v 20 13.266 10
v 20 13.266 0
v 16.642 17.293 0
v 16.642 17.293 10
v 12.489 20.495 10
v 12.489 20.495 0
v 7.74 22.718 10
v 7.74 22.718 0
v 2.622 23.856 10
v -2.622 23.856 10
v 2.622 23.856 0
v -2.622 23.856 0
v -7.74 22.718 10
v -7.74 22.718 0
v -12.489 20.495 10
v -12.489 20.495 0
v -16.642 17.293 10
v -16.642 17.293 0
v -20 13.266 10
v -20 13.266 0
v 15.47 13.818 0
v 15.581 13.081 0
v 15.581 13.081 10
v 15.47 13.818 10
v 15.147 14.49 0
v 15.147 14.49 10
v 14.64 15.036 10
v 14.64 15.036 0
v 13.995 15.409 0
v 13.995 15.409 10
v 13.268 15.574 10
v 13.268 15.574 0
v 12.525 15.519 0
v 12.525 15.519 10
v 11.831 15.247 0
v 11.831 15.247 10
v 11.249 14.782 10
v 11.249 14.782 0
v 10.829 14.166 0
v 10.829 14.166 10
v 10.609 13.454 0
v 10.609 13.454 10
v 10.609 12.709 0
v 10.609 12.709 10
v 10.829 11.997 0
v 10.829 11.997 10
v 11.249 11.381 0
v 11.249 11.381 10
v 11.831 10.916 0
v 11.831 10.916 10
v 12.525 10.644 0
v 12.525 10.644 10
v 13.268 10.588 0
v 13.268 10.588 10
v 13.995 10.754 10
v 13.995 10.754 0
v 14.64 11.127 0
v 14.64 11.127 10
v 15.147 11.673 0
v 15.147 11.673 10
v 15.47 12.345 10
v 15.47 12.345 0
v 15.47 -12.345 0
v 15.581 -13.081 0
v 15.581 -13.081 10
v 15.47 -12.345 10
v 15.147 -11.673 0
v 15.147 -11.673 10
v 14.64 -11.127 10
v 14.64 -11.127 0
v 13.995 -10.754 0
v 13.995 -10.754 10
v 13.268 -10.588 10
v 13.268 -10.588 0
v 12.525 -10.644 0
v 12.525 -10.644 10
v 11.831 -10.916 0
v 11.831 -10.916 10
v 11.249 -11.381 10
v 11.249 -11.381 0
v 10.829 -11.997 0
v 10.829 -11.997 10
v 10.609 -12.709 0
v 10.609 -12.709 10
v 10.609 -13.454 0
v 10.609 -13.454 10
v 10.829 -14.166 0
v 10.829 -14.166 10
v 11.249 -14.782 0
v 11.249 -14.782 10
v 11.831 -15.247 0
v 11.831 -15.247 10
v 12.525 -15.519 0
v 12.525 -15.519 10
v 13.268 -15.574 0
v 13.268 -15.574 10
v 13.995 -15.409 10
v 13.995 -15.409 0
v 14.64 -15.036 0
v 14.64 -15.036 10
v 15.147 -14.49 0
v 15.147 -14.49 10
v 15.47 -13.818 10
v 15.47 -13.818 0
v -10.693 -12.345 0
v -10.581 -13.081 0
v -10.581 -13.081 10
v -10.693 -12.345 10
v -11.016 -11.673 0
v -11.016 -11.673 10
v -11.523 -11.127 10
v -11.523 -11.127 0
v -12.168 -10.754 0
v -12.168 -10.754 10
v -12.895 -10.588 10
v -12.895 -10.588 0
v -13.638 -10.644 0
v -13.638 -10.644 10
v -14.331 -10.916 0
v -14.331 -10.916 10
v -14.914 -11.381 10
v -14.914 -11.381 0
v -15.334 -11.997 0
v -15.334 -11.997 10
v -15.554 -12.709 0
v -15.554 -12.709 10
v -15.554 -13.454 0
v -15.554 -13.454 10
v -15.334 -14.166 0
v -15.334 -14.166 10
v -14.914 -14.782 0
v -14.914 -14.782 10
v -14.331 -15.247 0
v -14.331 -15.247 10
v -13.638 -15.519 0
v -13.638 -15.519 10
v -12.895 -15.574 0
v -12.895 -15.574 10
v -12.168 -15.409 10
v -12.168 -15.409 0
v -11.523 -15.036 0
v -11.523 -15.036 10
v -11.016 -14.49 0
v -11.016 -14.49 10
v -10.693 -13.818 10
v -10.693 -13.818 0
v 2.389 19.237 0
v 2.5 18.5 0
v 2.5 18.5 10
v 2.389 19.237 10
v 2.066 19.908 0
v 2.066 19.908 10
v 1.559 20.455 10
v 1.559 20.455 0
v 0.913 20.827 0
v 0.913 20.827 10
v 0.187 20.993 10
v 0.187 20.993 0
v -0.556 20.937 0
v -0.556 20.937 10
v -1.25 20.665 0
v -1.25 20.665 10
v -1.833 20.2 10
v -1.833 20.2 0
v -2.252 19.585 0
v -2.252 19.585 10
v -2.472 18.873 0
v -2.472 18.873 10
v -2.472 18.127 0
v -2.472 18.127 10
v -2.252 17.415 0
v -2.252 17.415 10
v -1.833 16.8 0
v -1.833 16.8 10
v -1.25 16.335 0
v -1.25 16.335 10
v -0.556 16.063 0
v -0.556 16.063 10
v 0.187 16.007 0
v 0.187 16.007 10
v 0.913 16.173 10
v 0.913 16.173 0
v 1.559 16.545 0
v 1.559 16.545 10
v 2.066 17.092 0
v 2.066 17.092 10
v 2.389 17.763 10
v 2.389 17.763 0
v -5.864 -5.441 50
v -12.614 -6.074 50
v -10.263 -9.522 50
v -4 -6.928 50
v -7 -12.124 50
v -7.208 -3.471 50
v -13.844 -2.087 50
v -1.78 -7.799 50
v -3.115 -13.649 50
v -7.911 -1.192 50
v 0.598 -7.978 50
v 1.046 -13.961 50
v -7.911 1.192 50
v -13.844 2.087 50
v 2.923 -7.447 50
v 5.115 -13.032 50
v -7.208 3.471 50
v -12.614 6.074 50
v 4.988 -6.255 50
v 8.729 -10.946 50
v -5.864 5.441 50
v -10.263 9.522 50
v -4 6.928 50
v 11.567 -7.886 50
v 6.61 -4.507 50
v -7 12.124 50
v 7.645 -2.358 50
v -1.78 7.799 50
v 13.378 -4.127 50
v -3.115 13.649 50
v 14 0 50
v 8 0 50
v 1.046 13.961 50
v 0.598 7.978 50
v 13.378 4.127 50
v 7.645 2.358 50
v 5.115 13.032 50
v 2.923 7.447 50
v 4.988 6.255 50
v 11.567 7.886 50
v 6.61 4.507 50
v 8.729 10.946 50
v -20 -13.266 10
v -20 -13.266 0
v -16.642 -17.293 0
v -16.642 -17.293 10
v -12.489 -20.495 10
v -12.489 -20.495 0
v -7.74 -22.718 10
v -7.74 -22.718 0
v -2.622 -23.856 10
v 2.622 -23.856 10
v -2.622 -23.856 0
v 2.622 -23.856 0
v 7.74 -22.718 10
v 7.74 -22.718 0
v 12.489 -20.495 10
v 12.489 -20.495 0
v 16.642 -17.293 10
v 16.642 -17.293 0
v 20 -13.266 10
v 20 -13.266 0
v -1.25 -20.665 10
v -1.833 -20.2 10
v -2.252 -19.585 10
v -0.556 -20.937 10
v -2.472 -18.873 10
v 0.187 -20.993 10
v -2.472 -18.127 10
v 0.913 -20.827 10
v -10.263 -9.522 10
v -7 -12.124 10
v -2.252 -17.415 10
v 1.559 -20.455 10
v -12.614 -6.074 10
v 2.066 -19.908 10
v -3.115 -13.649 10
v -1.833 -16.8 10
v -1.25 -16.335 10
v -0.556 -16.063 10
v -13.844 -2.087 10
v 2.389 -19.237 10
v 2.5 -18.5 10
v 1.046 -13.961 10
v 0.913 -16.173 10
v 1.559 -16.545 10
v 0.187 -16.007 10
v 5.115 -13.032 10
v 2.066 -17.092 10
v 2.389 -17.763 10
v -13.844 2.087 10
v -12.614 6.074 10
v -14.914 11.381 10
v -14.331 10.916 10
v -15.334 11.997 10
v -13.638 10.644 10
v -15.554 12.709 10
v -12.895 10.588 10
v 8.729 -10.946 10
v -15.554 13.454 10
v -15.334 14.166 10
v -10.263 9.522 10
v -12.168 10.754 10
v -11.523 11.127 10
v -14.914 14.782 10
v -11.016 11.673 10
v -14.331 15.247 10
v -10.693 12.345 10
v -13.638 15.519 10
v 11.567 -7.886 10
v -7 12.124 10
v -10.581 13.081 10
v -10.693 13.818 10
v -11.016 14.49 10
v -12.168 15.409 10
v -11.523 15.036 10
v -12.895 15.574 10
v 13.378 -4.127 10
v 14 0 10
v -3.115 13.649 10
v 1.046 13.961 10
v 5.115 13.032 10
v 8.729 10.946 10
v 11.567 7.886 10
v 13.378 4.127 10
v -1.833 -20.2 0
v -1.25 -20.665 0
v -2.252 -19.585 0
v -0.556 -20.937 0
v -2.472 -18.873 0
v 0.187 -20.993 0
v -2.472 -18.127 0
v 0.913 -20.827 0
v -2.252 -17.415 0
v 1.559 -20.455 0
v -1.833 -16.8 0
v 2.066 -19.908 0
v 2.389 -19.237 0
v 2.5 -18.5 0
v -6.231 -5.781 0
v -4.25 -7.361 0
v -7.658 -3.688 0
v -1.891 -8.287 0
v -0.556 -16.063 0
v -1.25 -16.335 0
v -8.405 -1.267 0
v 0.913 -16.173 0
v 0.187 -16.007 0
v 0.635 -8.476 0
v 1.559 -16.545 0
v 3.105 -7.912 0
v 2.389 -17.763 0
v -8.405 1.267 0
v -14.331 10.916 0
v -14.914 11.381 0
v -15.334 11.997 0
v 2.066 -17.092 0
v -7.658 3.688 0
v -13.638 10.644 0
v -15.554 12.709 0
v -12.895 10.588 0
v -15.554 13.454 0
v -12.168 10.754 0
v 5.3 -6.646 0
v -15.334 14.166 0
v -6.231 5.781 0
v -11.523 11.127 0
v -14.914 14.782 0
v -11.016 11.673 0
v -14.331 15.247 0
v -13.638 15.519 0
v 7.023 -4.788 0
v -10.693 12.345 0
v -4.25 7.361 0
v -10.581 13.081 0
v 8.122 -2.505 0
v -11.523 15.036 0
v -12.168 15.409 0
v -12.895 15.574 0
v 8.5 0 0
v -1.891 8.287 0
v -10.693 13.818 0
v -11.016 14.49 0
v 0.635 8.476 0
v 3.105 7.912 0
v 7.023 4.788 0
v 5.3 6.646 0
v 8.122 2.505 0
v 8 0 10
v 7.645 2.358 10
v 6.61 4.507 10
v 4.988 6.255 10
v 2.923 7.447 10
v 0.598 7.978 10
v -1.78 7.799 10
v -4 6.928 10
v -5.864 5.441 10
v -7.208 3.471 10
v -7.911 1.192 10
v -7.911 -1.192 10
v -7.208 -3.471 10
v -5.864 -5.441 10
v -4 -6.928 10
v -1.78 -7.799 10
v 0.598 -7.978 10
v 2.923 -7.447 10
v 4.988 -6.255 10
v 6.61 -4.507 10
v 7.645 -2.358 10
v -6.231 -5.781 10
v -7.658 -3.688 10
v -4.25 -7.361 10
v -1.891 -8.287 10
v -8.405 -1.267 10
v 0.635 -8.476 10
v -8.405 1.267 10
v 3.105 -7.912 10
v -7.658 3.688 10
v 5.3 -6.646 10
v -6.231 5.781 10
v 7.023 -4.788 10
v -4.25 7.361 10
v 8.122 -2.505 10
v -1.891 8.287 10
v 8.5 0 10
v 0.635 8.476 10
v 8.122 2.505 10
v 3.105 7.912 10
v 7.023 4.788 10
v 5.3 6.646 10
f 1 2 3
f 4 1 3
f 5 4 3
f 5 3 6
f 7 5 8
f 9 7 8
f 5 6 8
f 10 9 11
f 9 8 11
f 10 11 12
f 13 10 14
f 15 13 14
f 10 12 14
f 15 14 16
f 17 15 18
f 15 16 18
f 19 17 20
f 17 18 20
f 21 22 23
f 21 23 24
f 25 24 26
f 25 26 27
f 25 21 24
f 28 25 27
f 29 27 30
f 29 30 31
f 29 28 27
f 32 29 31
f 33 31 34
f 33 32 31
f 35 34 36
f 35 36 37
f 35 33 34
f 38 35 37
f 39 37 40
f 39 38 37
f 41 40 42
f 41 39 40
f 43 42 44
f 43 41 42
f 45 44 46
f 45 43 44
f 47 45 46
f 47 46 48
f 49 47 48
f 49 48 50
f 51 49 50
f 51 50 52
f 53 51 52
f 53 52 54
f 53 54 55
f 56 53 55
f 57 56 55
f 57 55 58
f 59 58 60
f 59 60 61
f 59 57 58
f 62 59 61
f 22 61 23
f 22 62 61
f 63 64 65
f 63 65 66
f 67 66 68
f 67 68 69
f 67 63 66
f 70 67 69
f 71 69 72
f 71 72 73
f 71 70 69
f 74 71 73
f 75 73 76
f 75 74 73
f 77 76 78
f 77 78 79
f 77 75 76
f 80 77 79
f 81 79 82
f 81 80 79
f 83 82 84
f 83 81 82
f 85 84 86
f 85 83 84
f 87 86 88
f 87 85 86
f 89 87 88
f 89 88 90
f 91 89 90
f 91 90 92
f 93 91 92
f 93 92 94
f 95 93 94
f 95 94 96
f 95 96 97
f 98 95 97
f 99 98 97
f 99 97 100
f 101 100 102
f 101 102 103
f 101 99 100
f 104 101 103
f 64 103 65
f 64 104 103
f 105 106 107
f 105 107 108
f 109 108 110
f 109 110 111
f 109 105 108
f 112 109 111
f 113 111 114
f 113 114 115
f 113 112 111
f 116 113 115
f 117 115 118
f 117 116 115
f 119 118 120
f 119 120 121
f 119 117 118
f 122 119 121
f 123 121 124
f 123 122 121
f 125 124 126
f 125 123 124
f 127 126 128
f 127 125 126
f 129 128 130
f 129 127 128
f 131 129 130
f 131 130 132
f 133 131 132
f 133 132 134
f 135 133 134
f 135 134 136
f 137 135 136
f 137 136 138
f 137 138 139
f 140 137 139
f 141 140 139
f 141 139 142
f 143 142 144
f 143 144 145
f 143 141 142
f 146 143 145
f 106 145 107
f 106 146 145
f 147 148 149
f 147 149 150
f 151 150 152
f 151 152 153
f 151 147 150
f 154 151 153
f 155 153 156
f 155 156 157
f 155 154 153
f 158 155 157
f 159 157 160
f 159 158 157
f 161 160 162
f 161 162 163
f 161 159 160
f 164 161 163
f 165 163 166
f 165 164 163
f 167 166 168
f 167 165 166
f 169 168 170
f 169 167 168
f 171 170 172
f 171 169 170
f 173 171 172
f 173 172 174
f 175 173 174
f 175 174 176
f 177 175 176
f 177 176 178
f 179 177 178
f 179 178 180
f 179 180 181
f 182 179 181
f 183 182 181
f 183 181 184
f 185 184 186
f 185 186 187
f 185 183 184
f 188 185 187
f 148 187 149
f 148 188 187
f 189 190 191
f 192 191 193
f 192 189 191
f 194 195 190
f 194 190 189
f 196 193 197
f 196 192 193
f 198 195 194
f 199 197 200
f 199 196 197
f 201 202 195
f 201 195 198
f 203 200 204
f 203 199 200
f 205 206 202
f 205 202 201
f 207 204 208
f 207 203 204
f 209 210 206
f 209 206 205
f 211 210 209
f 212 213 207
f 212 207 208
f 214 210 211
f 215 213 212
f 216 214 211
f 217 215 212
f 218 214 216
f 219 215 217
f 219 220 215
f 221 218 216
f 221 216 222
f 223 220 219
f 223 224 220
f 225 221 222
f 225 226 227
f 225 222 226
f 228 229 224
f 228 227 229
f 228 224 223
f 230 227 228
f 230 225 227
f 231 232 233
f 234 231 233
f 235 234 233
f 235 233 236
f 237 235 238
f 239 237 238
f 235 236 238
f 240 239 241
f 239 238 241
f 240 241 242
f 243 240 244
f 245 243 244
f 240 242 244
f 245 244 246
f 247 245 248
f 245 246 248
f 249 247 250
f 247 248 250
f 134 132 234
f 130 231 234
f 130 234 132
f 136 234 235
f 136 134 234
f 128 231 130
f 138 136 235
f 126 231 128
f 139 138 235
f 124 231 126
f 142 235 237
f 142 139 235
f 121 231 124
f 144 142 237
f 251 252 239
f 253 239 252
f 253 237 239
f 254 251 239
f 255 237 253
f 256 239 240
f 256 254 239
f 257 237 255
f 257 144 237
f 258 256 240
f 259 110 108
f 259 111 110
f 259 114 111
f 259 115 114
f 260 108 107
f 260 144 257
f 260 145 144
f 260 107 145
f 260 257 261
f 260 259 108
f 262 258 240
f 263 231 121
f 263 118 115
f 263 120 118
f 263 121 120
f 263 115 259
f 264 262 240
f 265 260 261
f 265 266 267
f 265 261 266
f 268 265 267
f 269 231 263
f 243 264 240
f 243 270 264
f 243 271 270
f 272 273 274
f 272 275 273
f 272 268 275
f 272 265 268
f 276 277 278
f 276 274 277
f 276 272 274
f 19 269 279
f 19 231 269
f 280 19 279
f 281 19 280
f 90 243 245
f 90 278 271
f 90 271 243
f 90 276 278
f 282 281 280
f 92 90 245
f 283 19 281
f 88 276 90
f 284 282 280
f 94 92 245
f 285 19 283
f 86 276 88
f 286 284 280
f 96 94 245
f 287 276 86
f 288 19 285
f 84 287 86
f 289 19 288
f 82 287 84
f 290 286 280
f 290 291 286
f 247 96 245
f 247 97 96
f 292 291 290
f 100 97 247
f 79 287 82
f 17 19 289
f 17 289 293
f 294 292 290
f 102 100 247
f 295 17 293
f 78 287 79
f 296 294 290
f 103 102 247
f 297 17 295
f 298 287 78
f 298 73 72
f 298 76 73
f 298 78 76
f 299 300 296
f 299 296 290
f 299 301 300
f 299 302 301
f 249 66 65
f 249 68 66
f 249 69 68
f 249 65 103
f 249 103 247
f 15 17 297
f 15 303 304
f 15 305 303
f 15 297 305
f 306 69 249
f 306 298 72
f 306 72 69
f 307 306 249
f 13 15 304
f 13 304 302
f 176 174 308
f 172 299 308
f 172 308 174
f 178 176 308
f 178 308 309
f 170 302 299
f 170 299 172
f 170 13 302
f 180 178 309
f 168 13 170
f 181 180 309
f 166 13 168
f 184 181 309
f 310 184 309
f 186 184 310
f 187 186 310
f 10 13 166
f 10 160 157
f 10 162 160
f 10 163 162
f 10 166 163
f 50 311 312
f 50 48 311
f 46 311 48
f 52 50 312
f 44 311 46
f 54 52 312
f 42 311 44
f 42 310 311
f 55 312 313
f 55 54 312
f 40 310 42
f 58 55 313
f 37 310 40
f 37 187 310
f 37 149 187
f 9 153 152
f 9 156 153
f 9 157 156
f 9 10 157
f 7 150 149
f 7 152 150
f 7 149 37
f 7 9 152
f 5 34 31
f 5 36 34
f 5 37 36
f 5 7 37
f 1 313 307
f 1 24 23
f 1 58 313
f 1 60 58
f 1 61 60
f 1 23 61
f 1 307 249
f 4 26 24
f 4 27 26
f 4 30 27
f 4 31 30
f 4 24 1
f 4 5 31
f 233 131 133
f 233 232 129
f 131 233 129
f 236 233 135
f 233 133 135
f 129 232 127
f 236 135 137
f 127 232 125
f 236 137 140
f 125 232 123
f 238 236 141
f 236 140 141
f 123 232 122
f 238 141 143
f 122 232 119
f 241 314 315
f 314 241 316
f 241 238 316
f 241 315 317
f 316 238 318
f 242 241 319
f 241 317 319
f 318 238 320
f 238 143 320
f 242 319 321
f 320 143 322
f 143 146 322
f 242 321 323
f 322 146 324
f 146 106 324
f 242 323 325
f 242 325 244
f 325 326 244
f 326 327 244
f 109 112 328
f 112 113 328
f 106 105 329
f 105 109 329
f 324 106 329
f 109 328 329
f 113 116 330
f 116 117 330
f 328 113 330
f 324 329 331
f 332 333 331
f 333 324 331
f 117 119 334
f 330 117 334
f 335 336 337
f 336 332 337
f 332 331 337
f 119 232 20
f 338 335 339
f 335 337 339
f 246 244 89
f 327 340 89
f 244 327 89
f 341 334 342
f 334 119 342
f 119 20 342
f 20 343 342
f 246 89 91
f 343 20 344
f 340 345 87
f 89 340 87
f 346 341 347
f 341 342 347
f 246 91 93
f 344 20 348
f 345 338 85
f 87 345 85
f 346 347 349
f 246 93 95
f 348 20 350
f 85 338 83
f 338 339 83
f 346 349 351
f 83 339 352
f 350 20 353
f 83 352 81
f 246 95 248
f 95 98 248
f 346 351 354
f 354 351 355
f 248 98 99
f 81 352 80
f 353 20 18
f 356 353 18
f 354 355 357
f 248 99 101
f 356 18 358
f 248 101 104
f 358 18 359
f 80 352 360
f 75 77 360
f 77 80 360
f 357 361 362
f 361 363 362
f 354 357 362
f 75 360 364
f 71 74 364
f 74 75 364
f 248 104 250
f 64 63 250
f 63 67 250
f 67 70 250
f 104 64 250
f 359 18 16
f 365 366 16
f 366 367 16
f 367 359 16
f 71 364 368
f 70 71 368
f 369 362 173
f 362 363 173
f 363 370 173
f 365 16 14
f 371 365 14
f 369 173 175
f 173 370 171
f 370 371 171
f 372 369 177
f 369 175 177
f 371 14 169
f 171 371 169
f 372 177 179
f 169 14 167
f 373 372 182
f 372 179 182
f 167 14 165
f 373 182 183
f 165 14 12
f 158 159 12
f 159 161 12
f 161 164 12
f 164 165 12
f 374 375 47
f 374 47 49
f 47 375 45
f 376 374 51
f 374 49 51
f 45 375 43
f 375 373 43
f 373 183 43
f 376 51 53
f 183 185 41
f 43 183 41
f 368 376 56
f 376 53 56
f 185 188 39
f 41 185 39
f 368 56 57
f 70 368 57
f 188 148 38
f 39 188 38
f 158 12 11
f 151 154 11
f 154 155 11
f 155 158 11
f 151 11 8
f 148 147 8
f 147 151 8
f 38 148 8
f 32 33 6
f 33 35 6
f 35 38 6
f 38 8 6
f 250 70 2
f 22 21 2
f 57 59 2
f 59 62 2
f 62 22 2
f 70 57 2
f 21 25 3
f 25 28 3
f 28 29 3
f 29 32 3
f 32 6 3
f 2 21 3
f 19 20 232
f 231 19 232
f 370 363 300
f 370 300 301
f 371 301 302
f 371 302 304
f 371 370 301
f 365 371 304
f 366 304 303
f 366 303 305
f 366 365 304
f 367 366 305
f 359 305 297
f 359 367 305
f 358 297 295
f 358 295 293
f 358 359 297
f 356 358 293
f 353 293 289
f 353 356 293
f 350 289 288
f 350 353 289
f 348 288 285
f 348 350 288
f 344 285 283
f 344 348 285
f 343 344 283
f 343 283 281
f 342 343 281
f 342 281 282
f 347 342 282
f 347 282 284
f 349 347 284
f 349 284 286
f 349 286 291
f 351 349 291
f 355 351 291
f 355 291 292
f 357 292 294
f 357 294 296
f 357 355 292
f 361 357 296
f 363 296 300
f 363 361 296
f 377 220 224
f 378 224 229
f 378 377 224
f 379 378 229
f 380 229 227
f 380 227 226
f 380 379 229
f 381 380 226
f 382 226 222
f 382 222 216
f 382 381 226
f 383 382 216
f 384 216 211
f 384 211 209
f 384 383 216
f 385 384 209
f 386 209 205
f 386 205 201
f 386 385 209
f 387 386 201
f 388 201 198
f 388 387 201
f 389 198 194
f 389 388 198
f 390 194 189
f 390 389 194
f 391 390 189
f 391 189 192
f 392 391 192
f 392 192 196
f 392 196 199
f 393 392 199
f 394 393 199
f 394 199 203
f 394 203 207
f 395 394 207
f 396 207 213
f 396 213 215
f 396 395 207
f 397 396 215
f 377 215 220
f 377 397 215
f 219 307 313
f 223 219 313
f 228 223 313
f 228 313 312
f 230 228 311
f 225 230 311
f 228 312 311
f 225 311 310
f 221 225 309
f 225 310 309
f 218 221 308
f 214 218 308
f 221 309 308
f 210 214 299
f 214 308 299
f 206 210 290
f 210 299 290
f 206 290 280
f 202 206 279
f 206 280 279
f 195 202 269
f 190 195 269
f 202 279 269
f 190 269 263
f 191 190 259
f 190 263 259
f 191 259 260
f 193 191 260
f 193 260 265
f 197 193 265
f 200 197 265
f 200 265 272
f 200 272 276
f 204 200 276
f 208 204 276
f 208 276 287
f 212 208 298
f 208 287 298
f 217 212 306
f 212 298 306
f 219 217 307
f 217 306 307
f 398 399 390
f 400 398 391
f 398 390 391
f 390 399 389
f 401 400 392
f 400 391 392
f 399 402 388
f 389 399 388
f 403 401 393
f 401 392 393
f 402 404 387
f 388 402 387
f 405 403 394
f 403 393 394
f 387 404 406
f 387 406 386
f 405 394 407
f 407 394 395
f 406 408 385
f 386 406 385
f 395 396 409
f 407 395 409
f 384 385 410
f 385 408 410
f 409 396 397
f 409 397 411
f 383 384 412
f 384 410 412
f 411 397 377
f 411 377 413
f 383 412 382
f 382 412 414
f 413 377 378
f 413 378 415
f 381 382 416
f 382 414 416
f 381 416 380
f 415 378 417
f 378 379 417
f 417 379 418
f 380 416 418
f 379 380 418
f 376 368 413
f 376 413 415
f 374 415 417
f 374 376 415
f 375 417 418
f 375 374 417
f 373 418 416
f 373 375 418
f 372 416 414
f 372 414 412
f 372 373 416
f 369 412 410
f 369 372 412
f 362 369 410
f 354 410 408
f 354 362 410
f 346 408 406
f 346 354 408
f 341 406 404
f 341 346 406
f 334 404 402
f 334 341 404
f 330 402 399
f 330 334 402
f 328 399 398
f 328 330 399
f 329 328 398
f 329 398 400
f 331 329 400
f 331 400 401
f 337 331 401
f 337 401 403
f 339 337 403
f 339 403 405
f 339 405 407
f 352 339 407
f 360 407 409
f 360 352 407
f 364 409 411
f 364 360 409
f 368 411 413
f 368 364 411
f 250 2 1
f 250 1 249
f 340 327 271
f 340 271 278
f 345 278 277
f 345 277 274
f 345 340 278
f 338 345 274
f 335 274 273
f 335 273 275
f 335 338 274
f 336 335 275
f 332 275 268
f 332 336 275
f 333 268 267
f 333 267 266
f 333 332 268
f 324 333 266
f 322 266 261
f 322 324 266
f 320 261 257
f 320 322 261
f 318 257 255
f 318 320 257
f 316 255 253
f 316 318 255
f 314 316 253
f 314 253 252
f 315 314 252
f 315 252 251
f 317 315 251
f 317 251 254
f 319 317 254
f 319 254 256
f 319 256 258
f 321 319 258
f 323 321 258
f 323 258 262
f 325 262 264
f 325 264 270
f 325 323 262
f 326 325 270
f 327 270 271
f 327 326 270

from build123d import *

# Parameters (mm, degrees)
SKETCH_R      = 2.5
SKETCH_R_2    = 8.5
PAD_DEPTH     = 10
SKETCH001_R   = 14
SKETCH001_R_2 = 8
PAD001_DEPTH  = 40


with BuildPart() as part:
    # Sketch → Pad (new body)
    with BuildSketch(Plane.XY):
        with BuildLine():
            ThreePointArc((20, 13.266499), (0, 24), (-20, 13.266499))
            Line((-20, 13.266499), (-20, -13.266499))
            ThreePointArc((-20, -13.266499), (0, -24), (20, -13.266499))
            Line((20, 13.266499), (20, -13.266499))
        make_face()
        with Locations((0, 18.5)):
            Circle(SKETCH_R, mode=Mode.SUBTRACT)
        with Locations((0, -18.5)):
            Circle(SKETCH_R, mode=Mode.SUBTRACT)
        Circle(SKETCH_R_2, mode=Mode.SUBTRACT)
        with Locations((-13.081476, 13.081475)):
            Circle(SKETCH_R, mode=Mode.SUBTRACT)
        with Locations((-13.081476, -13.081475)):
            Circle(SKETCH_R, mode=Mode.SUBTRACT)
        with Locations((13.081476, -13.081475)):
            Circle(SKETCH_R, mode=Mode.SUBTRACT)
        with Locations((13.081476, 13.081475)):
            Circle(SKETCH_R, mode=Mode.SUBTRACT)
    extrude(amount=PAD_DEPTH)

    # Sketch001 → Pad001 (new body)
    with BuildSketch(Plane.XY.offset(10)):
        Circle(SKETCH001_R)
        Circle(SKETCH001_R_2, mode=Mode.SUBTRACT)
    extrude(amount=PAD001_DEPTH)


solid = part.part
